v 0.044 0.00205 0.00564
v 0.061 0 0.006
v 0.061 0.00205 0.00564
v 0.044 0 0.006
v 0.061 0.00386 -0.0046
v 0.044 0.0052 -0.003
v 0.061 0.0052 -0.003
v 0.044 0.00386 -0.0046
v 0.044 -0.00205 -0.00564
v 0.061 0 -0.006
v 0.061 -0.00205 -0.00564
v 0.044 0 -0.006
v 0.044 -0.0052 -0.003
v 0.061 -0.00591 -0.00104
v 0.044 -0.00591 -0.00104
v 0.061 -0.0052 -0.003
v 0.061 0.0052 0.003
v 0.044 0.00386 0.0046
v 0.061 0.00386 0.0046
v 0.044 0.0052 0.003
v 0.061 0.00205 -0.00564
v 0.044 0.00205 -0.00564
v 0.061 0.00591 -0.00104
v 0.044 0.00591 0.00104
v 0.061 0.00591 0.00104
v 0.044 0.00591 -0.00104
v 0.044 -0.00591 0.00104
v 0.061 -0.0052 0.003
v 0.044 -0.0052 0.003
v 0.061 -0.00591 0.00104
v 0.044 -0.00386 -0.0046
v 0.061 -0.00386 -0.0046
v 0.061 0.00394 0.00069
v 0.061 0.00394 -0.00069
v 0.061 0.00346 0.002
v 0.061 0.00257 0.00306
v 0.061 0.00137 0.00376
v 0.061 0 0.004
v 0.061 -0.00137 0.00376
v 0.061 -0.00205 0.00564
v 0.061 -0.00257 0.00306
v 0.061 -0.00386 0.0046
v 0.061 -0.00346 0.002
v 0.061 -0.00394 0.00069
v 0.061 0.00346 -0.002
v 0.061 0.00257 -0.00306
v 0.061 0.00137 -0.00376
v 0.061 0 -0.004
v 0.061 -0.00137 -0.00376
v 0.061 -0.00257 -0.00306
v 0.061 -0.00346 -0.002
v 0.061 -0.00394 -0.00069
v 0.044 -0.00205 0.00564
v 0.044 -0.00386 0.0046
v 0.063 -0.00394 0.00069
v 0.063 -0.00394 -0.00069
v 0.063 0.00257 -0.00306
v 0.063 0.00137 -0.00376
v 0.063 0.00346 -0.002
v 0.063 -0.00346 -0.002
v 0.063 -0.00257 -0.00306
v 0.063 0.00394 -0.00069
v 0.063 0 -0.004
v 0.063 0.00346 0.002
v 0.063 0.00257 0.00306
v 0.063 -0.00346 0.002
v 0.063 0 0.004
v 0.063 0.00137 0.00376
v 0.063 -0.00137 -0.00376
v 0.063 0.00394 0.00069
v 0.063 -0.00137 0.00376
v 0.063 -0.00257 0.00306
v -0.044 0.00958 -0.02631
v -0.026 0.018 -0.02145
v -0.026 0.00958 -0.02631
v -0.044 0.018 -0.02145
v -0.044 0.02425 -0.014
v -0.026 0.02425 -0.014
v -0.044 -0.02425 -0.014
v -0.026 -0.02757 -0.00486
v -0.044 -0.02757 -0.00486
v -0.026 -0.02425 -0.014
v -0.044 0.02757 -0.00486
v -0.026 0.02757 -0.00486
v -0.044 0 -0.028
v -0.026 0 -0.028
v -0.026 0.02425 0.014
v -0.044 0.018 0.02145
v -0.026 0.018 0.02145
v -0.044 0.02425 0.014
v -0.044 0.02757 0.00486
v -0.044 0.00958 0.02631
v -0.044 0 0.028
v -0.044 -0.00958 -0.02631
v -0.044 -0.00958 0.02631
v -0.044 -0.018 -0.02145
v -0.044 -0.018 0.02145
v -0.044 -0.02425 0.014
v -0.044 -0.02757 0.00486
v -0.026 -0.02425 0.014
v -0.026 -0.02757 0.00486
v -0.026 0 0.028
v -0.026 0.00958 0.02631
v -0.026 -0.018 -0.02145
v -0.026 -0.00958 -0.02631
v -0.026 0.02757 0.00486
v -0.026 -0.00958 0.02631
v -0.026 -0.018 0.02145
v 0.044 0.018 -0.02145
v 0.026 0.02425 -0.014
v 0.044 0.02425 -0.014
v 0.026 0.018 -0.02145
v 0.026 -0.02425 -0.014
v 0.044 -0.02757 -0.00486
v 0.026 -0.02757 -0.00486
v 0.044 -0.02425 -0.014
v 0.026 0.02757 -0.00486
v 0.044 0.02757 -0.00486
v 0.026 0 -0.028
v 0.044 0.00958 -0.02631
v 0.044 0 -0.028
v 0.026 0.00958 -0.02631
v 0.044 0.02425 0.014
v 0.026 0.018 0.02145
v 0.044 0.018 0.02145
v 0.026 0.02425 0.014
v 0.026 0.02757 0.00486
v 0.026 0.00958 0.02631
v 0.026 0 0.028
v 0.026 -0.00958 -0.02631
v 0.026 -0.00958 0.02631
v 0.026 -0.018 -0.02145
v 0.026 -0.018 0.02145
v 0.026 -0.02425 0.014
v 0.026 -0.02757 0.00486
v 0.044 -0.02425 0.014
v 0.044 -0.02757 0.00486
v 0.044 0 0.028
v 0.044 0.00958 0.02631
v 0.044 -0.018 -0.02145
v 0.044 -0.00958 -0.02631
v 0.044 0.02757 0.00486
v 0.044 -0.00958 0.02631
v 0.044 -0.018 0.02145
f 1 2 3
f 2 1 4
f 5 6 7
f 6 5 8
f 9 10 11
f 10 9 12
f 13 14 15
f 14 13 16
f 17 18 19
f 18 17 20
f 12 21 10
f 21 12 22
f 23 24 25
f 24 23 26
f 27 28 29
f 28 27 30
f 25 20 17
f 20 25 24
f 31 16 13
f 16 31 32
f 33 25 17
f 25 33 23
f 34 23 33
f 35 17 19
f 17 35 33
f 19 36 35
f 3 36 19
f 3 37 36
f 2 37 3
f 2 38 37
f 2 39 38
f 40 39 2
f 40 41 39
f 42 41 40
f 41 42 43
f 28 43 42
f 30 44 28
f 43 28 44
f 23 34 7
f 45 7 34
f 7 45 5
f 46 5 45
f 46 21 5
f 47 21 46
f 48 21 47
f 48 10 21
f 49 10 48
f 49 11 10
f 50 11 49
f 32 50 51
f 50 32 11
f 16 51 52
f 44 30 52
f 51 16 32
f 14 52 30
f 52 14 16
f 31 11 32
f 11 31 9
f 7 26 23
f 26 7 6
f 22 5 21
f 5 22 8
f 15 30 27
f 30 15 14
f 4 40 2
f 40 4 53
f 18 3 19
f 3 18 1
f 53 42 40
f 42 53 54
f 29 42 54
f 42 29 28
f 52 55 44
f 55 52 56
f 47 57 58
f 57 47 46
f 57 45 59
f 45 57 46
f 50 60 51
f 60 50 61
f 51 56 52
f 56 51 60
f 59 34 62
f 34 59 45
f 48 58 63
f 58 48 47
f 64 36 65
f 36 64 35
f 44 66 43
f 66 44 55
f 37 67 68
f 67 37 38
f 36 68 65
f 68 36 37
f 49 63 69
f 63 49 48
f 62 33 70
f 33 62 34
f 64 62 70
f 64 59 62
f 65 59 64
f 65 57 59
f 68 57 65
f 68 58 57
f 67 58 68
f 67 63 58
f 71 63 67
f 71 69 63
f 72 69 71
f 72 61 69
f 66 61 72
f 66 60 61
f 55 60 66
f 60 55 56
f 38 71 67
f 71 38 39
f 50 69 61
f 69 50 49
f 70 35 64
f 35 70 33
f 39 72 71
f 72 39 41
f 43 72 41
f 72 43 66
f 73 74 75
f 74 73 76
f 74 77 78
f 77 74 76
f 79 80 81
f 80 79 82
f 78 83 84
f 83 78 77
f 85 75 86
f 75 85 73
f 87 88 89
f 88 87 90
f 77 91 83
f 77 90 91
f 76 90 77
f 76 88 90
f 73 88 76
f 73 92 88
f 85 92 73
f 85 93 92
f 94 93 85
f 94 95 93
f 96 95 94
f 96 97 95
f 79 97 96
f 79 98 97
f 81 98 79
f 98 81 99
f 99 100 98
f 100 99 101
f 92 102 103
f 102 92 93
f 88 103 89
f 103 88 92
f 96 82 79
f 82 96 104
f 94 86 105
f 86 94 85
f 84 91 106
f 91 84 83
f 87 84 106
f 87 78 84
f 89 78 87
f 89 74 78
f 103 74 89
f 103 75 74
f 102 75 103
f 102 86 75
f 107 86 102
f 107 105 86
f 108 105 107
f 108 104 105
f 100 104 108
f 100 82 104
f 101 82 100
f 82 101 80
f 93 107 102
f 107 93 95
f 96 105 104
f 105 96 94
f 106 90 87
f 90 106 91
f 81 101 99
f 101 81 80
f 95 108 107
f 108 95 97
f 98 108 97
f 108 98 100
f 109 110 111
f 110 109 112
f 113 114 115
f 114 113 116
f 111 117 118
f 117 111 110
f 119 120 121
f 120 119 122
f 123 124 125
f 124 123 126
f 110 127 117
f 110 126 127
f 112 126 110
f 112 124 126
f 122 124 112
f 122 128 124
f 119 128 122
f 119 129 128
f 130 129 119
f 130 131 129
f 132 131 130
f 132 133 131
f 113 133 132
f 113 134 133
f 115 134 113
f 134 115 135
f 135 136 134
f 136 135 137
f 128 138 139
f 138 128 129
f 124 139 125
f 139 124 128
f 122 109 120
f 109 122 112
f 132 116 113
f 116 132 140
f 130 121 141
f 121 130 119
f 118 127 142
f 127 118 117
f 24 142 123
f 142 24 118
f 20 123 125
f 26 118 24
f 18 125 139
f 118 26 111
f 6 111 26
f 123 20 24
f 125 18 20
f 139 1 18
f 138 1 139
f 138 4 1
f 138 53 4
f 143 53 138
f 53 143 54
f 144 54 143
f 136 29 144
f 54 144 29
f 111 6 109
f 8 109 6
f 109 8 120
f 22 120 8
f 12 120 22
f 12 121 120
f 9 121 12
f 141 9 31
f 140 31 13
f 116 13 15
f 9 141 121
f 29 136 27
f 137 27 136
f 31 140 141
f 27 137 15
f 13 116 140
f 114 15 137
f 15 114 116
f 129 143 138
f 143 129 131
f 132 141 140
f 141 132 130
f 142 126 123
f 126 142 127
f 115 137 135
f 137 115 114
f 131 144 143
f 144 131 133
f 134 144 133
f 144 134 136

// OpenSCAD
$fn=64;

L = 0.1;
W = 0.1;
H = 0.0;

module hull_body() {
    translate([0,0,0])
        cube([L*0.70, W*0.55, H], center=true);
}

module end_pod(xpos) {
    translate([xpos,0,0])
        rotate([0,90,0])
            cylinder(h=L*0.18, r=W*0.28, center=true, $fn=18);
}

module turret_faceted() {
    hull() {
        translate([0,0,0])
            cube([L*0.22, W*0.22, H], center=true);
        translate([0,0,0])
            rotate([0,0,45])
                cube([L*0.16, W*0.16, H], center=true);
        translate([0,0,0])
            rotate([0,0,22.5])
                cube([L*0.18, W*0.12, H], center=true);
    }
}

module barrel() {
    translate([L*0.50,0,0])
        rotate([0,90,0])
            cylinder(h=L*0.22, r=W*0.06, center=true, $fn=18);
    translate([L*0.60,0,0])
        rotate([0,90,0])
            cylinder(h=L*0.06, r=W*0.04, center=true, $fn=18);
}

module fin(side=1) {
    s = side;
    translate([0, s*(W*0.33), 0])
        rotate([0,0, s*10])
            linear_extrude(height=H, center=true, convexity=2)
                polygon(points=[
                    [-L*0.08, 0],
                    [ L*0.08, 0],
                    [ L*0.02, W*0.10]
                ]);
}

module vehicle() {
    union() {
        hull_body();
        end_pod(-L*0.35);
        end_pod( L*0.35);
        turret_faceted();
        barrel();
        fin(1);
        fin(-1);
    }
}

vehicle();
